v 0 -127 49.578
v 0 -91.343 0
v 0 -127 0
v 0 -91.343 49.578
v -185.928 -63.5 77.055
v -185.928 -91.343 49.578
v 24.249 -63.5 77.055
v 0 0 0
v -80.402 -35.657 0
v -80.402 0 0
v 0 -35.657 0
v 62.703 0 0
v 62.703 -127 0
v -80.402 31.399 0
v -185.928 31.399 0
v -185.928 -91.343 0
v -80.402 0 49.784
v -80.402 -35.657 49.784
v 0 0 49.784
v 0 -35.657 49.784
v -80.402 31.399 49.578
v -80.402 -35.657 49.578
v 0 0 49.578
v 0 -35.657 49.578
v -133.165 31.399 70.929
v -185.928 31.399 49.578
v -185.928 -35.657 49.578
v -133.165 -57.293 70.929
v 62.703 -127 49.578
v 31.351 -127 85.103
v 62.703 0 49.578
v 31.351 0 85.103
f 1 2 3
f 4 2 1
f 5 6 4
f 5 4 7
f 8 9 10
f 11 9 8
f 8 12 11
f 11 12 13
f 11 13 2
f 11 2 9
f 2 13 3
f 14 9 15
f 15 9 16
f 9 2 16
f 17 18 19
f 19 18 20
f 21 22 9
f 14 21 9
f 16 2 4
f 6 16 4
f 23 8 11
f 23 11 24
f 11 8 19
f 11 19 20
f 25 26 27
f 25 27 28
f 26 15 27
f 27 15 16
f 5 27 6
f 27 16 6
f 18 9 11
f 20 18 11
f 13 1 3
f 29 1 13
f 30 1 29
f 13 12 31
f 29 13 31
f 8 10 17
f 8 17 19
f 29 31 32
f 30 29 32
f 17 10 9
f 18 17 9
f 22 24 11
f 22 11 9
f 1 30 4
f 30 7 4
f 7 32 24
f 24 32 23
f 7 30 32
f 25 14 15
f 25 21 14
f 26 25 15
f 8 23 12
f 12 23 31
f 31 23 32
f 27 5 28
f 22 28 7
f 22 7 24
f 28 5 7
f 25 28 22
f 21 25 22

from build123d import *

# Parameters (mm, degrees)
F0_W     = 62.7026483417
F0_H     = 49.5783016086
F1_DEPTH = 127
F4_DEPTH = 185.928
F7_DEPTH = 67.056
F8_W     = 80.4015269012
F8_H     = 35.6574634314
F9_DEPTH = 49.784


with BuildPart() as f1:
    # F0 (on Front) → F1 (new body)
    with BuildSketch(Plane.XZ):
        with Locations((31.3513241708, 24.7891508043)):
            Rectangle(F0_W, F0_H)
        Polygon((31.3513241708, 85.1031681778), (0, 49.5783016086), (62.7026483417, 49.5783016086), align=None)
    extrude(amount=F1_DEPTH)

    # F2 (on face) → F3 (join, up to the next surface of F1)
    with BuildSketch(Plane(origin=(0, 0, 0), x_dir=(0, -1, 0), z_dir=(-1, 0, 0))):
        Polygon((91.3425365686, 49.5783016086), (63.5, 77.0548433065), (35.6574634314, 49.5783016086), (35.6574634314, 0), (91.3425365686, 0), align=None)
    extrude(until=Until.NEXT, dir=(1, 0, 0))

    # F2 (on face) → F4 (join)
    with BuildSketch(Plane(origin=(0, 0, 0), x_dir=(0, -1, 0), z_dir=(-1, 0, 0))):
        Polygon((91.3425365686, 49.5783016086), (63.5, 77.0548433065), (35.6574634314, 49.5783016086), (35.6574634314, 0), (91.3425365686, 0), align=None)
    extrude(amount=F4_DEPTH)

    # F5 (on face) → F6 (join, up to the next surface of F1)
    with BuildSketch(Plane(origin=(0, -35.6574634314, 0), x_dir=(-1, 0, 0), z_dir=(0, 1, 0))):
        Polygon((80.4015269012, 49.5783016086), (185.928, 49.5783016086), (133.1647634506, 70.9294825792), align=None)
    extrude(until=Until.NEXT, dir=(0, -1, 0))

    # F5 (on face) → F7 (join)
    with BuildSketch(Plane(origin=(0, -35.6574634314, 0), x_dir=(-1, 0, 0), z_dir=(0, 1, 0))):
        Polygon((80.4015269012, 0), (185.928, 0), (185.928, 49.5783016086), (133.1647634506, 70.9294825792), (80.4015269012, 49.5783016086), align=None)
    extrude(amount=F7_DEPTH)


with BuildPart() as f9:
    # F8 (on face) → F9 (new body)
    with BuildSketch(Plane(origin=(0, 0, 0), x_dir=(1, 0, 0), z_dir=(0, 0, -1))):
        with Locations((-40.2007634506, 17.8287317157)):
            Rectangle(F8_W, F8_H)
    extrude(amount=-F9_DEPTH)


solid = Compound([f1.part, f9.part])
